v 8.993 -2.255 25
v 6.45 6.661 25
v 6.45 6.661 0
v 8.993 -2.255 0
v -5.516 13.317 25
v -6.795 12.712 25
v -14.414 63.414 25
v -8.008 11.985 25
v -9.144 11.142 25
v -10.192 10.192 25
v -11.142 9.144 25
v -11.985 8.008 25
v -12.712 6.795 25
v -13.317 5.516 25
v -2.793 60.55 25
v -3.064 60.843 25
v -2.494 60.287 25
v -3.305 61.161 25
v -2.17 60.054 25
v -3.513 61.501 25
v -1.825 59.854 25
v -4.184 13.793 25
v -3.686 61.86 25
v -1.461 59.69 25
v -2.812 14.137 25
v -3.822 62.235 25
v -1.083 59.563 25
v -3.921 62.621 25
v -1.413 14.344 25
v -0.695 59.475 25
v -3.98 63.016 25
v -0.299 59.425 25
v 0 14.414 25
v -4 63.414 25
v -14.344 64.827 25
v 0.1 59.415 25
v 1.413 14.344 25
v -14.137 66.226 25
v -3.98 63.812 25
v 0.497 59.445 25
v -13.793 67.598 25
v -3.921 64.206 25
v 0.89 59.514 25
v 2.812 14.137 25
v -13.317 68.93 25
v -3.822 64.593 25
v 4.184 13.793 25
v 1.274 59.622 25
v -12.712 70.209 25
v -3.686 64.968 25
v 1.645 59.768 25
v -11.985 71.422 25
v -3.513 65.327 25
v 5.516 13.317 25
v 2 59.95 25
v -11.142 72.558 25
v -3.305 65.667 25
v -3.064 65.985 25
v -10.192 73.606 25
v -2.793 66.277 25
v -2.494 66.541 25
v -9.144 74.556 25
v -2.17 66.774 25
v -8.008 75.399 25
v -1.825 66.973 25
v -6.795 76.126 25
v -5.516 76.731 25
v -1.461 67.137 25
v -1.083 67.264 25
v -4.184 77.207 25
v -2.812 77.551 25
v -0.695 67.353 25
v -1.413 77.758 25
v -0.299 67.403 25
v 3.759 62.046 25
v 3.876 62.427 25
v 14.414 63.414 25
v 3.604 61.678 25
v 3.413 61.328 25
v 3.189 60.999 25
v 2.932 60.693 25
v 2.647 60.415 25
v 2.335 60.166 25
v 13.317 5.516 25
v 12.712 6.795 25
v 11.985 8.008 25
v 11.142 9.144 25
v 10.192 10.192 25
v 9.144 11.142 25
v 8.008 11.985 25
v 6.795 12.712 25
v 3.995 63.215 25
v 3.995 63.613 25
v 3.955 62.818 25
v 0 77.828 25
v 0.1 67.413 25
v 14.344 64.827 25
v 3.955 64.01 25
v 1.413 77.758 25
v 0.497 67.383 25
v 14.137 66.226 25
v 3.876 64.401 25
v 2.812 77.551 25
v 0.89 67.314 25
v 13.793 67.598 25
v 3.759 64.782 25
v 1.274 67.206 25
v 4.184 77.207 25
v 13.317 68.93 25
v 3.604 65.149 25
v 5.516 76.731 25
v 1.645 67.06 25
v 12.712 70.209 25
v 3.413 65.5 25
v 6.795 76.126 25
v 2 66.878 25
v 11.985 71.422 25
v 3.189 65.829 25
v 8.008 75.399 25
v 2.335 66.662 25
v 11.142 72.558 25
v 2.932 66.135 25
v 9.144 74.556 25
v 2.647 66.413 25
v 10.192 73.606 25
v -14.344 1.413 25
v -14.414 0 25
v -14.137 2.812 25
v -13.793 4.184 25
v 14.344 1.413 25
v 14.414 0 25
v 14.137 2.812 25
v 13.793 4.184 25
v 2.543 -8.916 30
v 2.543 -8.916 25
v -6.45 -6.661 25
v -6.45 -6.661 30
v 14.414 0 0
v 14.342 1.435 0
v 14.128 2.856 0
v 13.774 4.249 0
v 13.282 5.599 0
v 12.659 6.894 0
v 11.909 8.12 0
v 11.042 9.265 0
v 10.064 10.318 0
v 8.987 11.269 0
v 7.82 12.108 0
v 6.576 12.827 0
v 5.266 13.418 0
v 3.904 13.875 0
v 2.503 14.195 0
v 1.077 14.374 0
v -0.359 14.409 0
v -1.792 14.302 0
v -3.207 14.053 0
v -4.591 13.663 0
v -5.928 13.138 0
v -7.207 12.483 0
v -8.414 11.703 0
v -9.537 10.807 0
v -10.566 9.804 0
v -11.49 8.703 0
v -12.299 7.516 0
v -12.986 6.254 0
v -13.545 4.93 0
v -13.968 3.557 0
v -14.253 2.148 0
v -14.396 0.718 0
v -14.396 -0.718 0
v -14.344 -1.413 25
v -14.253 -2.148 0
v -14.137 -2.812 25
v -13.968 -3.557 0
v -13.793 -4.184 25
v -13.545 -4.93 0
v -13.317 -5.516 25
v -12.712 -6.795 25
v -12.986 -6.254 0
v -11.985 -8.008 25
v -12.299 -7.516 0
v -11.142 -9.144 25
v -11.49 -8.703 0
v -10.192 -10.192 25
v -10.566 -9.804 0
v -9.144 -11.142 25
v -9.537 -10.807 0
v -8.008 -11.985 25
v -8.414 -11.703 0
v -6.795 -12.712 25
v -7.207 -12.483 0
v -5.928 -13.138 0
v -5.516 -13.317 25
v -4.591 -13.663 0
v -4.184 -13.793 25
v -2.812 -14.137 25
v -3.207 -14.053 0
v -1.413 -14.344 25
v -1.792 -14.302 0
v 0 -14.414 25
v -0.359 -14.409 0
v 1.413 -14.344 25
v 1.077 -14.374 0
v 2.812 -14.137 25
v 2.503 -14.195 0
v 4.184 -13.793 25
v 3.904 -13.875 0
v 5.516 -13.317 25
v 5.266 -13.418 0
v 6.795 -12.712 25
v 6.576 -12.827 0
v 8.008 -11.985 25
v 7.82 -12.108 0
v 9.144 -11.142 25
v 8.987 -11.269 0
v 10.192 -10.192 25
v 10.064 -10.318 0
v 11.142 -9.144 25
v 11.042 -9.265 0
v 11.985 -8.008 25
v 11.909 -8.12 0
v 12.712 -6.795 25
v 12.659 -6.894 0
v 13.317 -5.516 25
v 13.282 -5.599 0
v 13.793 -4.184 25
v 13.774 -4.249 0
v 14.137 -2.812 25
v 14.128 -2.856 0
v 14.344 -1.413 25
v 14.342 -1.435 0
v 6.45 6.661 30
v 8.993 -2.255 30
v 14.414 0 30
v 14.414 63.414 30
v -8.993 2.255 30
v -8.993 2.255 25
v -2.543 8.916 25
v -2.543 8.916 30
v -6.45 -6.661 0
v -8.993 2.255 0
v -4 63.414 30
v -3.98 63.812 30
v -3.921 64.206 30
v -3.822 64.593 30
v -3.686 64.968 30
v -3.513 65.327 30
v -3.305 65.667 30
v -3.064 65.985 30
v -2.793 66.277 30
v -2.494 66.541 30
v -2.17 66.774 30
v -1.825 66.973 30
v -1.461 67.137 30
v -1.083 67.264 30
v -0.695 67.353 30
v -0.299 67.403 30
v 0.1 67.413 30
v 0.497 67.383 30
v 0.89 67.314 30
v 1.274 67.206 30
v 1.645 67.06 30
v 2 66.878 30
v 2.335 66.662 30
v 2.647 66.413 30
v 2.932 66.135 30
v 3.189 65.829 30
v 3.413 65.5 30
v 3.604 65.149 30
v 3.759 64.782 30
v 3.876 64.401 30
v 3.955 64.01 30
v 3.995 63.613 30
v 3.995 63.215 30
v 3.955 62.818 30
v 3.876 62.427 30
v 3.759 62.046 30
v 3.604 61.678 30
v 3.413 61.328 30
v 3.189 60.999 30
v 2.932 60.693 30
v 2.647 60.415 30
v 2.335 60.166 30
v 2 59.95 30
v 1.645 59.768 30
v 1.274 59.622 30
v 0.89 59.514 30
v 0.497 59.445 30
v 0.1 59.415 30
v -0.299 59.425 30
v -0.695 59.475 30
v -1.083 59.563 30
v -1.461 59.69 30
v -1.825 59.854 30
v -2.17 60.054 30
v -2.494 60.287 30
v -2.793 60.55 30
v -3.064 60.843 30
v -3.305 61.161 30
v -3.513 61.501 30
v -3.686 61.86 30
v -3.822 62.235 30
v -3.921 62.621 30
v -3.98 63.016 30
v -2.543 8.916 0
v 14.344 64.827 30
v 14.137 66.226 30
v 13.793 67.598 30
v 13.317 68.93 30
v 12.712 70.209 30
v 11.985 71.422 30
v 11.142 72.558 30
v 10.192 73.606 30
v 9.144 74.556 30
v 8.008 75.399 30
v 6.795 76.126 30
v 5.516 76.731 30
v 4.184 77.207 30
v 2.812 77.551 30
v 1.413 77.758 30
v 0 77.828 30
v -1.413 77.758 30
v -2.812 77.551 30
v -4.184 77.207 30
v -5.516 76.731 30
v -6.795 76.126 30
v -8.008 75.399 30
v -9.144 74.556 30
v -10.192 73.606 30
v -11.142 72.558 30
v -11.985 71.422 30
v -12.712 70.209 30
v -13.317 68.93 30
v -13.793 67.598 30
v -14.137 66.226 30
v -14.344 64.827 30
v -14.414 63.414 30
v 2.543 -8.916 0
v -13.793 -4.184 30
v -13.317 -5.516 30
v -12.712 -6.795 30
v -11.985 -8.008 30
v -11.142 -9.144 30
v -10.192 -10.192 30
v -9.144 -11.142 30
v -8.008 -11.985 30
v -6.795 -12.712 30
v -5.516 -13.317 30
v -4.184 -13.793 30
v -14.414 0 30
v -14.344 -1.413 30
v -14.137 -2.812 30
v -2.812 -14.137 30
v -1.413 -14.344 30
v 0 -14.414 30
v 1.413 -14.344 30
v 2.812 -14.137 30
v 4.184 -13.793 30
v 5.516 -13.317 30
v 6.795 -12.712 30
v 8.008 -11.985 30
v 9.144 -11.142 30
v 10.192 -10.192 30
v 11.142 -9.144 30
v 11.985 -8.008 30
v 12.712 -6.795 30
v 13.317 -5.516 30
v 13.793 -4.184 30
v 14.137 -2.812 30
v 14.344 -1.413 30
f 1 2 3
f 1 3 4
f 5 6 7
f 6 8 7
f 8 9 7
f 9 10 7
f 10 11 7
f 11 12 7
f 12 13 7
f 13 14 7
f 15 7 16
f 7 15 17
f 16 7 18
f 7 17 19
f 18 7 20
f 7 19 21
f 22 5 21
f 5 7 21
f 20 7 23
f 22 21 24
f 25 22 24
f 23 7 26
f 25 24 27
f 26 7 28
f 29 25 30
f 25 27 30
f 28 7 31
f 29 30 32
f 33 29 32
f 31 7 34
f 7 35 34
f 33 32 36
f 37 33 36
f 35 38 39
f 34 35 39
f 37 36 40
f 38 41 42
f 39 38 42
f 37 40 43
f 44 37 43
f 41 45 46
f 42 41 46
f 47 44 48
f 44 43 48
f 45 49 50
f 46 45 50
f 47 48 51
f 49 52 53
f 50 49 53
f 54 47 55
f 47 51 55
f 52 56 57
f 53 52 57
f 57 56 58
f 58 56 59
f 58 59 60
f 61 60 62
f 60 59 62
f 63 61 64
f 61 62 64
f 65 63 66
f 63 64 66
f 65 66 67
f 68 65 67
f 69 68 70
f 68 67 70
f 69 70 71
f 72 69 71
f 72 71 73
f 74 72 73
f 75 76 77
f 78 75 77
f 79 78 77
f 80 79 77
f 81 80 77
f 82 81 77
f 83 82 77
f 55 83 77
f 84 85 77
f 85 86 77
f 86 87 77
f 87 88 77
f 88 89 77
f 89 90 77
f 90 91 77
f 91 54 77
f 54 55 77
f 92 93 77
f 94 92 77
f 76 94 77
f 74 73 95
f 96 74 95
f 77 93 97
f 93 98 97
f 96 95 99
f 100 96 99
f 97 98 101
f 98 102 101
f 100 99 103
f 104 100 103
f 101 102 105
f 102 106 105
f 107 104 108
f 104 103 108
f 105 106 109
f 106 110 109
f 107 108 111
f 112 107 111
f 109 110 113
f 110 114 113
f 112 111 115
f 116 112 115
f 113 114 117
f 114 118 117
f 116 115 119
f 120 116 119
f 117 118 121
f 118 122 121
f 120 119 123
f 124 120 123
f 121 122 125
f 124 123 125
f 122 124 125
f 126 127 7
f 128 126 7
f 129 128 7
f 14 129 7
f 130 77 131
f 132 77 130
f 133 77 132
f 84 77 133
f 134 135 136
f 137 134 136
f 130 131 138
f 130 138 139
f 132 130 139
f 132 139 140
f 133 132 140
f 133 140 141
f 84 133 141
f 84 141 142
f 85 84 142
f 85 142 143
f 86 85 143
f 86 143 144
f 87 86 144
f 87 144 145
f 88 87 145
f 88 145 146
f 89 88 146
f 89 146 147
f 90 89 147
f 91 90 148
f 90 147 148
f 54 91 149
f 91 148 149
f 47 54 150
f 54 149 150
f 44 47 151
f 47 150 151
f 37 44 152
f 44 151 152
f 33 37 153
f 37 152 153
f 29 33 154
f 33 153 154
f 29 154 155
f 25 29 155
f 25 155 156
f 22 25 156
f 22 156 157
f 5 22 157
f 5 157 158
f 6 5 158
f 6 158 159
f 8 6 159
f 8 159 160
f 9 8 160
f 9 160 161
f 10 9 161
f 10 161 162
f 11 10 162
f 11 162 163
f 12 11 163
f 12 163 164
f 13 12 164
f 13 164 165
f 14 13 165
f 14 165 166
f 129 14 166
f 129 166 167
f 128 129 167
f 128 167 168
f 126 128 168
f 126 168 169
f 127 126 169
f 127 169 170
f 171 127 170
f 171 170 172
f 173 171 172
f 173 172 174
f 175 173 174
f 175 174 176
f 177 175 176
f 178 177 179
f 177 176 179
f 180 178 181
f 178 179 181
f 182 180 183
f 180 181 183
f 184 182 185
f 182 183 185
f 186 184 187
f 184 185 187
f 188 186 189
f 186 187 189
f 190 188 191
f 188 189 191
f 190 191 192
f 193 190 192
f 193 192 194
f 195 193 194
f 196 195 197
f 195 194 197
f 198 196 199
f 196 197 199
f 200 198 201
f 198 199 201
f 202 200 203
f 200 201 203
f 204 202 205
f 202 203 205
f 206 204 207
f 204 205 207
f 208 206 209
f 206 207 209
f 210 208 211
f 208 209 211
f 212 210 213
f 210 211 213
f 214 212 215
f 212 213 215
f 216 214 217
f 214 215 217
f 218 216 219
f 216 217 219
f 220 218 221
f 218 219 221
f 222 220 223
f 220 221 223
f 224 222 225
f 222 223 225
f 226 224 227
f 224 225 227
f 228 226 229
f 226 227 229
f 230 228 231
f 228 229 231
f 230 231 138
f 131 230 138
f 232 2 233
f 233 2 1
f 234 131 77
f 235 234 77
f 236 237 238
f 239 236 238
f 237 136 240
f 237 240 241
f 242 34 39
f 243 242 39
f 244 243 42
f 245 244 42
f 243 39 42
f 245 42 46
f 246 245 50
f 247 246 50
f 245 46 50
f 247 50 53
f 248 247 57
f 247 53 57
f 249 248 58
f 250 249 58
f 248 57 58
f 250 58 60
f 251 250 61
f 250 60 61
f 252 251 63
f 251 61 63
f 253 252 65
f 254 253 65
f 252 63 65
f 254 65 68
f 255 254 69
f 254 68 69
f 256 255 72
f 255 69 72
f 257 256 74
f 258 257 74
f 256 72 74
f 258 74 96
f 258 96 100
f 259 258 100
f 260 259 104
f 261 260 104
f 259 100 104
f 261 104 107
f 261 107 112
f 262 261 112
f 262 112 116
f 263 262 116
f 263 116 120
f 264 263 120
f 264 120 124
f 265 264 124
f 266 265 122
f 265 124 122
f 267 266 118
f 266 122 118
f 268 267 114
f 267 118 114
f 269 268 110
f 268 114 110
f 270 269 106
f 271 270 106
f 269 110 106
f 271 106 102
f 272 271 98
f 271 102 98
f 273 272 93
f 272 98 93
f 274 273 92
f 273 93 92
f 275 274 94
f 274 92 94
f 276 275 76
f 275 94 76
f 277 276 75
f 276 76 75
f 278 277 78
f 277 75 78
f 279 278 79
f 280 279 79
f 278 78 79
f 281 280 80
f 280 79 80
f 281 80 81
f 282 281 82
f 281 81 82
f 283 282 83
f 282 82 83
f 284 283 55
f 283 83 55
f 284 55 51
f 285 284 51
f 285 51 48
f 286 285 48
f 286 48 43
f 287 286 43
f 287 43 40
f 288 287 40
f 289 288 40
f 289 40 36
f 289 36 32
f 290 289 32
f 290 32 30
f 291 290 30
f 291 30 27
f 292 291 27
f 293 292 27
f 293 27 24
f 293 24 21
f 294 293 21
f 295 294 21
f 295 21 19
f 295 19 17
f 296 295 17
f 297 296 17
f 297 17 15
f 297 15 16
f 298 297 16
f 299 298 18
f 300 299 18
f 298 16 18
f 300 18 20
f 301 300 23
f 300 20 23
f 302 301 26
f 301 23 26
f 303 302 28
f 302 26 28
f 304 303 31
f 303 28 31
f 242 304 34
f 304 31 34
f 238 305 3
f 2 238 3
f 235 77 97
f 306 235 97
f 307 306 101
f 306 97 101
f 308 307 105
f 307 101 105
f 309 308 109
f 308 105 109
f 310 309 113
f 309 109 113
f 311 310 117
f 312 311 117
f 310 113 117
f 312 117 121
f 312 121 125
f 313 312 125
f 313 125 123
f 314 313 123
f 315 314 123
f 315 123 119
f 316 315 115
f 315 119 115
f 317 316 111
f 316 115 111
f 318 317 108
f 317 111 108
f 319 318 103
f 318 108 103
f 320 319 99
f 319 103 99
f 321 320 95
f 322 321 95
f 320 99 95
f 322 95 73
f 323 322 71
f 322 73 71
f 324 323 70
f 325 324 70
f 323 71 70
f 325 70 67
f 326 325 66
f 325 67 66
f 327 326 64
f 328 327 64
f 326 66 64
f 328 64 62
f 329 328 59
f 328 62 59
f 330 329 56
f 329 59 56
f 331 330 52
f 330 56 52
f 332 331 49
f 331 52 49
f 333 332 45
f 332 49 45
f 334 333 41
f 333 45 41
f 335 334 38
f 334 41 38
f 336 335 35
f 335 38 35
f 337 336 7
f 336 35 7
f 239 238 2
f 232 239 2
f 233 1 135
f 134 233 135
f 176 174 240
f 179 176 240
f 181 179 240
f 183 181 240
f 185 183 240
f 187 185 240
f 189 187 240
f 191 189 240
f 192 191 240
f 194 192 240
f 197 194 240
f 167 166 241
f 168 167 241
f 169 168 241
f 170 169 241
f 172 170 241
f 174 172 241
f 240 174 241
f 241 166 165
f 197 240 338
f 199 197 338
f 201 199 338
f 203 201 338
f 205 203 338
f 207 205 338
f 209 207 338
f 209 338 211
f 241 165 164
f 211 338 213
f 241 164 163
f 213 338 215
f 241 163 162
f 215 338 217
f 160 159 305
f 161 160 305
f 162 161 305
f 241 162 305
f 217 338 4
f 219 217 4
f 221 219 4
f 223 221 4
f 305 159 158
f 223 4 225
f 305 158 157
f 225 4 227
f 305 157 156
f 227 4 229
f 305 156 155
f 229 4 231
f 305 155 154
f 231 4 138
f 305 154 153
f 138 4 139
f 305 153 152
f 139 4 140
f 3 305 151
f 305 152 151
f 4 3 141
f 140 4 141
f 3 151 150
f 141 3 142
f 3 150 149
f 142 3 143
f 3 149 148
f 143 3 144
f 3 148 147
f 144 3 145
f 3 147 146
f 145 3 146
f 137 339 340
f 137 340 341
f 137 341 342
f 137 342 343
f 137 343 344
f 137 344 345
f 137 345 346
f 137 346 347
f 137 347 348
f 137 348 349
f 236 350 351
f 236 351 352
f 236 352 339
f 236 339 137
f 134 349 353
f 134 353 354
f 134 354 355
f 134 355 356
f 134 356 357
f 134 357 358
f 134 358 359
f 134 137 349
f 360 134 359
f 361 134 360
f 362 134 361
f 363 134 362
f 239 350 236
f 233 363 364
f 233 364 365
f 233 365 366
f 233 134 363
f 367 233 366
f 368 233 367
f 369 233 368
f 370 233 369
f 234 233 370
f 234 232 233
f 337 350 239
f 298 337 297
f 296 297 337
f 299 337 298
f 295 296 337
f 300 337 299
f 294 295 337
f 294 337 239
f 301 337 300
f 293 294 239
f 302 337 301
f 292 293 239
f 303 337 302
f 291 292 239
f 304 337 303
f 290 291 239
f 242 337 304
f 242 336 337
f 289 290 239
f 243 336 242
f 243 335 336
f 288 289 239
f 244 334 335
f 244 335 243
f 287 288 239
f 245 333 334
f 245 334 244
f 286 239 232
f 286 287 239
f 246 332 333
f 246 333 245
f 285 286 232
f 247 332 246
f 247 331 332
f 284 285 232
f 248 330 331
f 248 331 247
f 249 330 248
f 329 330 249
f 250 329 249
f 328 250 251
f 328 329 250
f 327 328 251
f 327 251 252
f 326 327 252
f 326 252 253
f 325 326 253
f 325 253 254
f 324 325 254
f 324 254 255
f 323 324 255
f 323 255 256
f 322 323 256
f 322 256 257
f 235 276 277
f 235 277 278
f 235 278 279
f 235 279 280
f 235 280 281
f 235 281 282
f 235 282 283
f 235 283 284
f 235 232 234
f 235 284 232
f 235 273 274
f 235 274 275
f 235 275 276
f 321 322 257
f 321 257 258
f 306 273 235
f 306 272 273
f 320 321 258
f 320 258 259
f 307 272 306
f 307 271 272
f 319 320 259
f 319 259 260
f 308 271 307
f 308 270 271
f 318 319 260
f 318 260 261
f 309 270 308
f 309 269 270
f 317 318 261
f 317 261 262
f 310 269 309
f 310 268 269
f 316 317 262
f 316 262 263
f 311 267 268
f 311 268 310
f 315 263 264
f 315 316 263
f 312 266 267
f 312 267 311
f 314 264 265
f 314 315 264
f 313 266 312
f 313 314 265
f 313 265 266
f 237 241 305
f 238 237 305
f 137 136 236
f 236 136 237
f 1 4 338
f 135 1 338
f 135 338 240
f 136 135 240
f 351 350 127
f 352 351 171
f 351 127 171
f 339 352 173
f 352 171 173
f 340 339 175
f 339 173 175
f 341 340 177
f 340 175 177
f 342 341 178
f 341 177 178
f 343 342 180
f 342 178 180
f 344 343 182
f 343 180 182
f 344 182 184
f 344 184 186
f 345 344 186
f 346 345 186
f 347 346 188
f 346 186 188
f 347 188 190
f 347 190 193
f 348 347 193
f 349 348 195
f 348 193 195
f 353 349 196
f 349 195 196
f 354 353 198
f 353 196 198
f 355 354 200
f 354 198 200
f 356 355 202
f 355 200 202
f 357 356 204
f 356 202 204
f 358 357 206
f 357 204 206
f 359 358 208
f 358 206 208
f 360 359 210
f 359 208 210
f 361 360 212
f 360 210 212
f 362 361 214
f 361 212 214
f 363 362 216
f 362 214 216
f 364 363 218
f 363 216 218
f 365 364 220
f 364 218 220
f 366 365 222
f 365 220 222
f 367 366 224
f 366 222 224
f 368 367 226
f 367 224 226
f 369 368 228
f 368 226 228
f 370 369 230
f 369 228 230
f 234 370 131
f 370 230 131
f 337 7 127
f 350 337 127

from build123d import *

# Parameters (mm, degrees)
F0_R     = 14.413893
F1_DEPTH = 25
F3_DEPTH = 5


with BuildPart() as f1:
    # F0 (on Top) → F1 (new body)
    with BuildSketch(Plane.XY):
        Circle(F0_R)
        Polygon((6.449648, 6.660601), (8.993074, -2.255258), (2.543426, -8.915859), (-6.449648, -6.660601), (-8.993074, 2.255258), (-2.543426, 8.915859), align=None, mode=Mode.SUBTRACT)
    extrude(amount=F1_DEPTH)

    # F2 (on face) → F3 (join)
    with BuildSketch(Plane.XY.offset(25)):
        with BuildLine():
            Line((-14.413893, 63.413893), (-14.413893, 0))
            ThreePointArc((-14.413893, 0), (0, 14.413893), (14.413893, 0))
            Line((14.413893, 0), (14.413893, 63.413893))
            Line((14.413893, 63.413893), (4, 63.413893))
            ThreePointArc((4, 63.413893), (0, 59.413893), (-4, 63.413893))
            Line((-4, 63.413893), (-14.413893, 63.413893))
        make_face()
        with BuildLine():
            ThreePointArc((14.413893, 0), (0, 14.413893), (-14.413893, 0))
            ThreePointArc((-14.413893, 0), (0, -14.413893), (14.413893, 0))
        make_face()
        Polygon((-2.543426, 8.915859), (6.449648, 6.660601), (8.993074, -2.255258), (2.543426, -8.915859), (-6.449648, -6.660601), (-8.993074, 2.255258), align=None, mode=Mode.SUBTRACT)
        with BuildLine():
            ThreePointArc((14.413893, 63.413893), (0, 77.827787), (-14.413893, 63.413893))
            Line((-14.413893, 63.413893), (-4, 63.413893))
            ThreePointArc((-4, 63.413893), (0, 67.413893), (4, 63.413893))
            Line((4, 63.413893), (14.413893, 63.413893))
        make_face()
    extrude(amount=F3_DEPTH)


solid = f1.part
